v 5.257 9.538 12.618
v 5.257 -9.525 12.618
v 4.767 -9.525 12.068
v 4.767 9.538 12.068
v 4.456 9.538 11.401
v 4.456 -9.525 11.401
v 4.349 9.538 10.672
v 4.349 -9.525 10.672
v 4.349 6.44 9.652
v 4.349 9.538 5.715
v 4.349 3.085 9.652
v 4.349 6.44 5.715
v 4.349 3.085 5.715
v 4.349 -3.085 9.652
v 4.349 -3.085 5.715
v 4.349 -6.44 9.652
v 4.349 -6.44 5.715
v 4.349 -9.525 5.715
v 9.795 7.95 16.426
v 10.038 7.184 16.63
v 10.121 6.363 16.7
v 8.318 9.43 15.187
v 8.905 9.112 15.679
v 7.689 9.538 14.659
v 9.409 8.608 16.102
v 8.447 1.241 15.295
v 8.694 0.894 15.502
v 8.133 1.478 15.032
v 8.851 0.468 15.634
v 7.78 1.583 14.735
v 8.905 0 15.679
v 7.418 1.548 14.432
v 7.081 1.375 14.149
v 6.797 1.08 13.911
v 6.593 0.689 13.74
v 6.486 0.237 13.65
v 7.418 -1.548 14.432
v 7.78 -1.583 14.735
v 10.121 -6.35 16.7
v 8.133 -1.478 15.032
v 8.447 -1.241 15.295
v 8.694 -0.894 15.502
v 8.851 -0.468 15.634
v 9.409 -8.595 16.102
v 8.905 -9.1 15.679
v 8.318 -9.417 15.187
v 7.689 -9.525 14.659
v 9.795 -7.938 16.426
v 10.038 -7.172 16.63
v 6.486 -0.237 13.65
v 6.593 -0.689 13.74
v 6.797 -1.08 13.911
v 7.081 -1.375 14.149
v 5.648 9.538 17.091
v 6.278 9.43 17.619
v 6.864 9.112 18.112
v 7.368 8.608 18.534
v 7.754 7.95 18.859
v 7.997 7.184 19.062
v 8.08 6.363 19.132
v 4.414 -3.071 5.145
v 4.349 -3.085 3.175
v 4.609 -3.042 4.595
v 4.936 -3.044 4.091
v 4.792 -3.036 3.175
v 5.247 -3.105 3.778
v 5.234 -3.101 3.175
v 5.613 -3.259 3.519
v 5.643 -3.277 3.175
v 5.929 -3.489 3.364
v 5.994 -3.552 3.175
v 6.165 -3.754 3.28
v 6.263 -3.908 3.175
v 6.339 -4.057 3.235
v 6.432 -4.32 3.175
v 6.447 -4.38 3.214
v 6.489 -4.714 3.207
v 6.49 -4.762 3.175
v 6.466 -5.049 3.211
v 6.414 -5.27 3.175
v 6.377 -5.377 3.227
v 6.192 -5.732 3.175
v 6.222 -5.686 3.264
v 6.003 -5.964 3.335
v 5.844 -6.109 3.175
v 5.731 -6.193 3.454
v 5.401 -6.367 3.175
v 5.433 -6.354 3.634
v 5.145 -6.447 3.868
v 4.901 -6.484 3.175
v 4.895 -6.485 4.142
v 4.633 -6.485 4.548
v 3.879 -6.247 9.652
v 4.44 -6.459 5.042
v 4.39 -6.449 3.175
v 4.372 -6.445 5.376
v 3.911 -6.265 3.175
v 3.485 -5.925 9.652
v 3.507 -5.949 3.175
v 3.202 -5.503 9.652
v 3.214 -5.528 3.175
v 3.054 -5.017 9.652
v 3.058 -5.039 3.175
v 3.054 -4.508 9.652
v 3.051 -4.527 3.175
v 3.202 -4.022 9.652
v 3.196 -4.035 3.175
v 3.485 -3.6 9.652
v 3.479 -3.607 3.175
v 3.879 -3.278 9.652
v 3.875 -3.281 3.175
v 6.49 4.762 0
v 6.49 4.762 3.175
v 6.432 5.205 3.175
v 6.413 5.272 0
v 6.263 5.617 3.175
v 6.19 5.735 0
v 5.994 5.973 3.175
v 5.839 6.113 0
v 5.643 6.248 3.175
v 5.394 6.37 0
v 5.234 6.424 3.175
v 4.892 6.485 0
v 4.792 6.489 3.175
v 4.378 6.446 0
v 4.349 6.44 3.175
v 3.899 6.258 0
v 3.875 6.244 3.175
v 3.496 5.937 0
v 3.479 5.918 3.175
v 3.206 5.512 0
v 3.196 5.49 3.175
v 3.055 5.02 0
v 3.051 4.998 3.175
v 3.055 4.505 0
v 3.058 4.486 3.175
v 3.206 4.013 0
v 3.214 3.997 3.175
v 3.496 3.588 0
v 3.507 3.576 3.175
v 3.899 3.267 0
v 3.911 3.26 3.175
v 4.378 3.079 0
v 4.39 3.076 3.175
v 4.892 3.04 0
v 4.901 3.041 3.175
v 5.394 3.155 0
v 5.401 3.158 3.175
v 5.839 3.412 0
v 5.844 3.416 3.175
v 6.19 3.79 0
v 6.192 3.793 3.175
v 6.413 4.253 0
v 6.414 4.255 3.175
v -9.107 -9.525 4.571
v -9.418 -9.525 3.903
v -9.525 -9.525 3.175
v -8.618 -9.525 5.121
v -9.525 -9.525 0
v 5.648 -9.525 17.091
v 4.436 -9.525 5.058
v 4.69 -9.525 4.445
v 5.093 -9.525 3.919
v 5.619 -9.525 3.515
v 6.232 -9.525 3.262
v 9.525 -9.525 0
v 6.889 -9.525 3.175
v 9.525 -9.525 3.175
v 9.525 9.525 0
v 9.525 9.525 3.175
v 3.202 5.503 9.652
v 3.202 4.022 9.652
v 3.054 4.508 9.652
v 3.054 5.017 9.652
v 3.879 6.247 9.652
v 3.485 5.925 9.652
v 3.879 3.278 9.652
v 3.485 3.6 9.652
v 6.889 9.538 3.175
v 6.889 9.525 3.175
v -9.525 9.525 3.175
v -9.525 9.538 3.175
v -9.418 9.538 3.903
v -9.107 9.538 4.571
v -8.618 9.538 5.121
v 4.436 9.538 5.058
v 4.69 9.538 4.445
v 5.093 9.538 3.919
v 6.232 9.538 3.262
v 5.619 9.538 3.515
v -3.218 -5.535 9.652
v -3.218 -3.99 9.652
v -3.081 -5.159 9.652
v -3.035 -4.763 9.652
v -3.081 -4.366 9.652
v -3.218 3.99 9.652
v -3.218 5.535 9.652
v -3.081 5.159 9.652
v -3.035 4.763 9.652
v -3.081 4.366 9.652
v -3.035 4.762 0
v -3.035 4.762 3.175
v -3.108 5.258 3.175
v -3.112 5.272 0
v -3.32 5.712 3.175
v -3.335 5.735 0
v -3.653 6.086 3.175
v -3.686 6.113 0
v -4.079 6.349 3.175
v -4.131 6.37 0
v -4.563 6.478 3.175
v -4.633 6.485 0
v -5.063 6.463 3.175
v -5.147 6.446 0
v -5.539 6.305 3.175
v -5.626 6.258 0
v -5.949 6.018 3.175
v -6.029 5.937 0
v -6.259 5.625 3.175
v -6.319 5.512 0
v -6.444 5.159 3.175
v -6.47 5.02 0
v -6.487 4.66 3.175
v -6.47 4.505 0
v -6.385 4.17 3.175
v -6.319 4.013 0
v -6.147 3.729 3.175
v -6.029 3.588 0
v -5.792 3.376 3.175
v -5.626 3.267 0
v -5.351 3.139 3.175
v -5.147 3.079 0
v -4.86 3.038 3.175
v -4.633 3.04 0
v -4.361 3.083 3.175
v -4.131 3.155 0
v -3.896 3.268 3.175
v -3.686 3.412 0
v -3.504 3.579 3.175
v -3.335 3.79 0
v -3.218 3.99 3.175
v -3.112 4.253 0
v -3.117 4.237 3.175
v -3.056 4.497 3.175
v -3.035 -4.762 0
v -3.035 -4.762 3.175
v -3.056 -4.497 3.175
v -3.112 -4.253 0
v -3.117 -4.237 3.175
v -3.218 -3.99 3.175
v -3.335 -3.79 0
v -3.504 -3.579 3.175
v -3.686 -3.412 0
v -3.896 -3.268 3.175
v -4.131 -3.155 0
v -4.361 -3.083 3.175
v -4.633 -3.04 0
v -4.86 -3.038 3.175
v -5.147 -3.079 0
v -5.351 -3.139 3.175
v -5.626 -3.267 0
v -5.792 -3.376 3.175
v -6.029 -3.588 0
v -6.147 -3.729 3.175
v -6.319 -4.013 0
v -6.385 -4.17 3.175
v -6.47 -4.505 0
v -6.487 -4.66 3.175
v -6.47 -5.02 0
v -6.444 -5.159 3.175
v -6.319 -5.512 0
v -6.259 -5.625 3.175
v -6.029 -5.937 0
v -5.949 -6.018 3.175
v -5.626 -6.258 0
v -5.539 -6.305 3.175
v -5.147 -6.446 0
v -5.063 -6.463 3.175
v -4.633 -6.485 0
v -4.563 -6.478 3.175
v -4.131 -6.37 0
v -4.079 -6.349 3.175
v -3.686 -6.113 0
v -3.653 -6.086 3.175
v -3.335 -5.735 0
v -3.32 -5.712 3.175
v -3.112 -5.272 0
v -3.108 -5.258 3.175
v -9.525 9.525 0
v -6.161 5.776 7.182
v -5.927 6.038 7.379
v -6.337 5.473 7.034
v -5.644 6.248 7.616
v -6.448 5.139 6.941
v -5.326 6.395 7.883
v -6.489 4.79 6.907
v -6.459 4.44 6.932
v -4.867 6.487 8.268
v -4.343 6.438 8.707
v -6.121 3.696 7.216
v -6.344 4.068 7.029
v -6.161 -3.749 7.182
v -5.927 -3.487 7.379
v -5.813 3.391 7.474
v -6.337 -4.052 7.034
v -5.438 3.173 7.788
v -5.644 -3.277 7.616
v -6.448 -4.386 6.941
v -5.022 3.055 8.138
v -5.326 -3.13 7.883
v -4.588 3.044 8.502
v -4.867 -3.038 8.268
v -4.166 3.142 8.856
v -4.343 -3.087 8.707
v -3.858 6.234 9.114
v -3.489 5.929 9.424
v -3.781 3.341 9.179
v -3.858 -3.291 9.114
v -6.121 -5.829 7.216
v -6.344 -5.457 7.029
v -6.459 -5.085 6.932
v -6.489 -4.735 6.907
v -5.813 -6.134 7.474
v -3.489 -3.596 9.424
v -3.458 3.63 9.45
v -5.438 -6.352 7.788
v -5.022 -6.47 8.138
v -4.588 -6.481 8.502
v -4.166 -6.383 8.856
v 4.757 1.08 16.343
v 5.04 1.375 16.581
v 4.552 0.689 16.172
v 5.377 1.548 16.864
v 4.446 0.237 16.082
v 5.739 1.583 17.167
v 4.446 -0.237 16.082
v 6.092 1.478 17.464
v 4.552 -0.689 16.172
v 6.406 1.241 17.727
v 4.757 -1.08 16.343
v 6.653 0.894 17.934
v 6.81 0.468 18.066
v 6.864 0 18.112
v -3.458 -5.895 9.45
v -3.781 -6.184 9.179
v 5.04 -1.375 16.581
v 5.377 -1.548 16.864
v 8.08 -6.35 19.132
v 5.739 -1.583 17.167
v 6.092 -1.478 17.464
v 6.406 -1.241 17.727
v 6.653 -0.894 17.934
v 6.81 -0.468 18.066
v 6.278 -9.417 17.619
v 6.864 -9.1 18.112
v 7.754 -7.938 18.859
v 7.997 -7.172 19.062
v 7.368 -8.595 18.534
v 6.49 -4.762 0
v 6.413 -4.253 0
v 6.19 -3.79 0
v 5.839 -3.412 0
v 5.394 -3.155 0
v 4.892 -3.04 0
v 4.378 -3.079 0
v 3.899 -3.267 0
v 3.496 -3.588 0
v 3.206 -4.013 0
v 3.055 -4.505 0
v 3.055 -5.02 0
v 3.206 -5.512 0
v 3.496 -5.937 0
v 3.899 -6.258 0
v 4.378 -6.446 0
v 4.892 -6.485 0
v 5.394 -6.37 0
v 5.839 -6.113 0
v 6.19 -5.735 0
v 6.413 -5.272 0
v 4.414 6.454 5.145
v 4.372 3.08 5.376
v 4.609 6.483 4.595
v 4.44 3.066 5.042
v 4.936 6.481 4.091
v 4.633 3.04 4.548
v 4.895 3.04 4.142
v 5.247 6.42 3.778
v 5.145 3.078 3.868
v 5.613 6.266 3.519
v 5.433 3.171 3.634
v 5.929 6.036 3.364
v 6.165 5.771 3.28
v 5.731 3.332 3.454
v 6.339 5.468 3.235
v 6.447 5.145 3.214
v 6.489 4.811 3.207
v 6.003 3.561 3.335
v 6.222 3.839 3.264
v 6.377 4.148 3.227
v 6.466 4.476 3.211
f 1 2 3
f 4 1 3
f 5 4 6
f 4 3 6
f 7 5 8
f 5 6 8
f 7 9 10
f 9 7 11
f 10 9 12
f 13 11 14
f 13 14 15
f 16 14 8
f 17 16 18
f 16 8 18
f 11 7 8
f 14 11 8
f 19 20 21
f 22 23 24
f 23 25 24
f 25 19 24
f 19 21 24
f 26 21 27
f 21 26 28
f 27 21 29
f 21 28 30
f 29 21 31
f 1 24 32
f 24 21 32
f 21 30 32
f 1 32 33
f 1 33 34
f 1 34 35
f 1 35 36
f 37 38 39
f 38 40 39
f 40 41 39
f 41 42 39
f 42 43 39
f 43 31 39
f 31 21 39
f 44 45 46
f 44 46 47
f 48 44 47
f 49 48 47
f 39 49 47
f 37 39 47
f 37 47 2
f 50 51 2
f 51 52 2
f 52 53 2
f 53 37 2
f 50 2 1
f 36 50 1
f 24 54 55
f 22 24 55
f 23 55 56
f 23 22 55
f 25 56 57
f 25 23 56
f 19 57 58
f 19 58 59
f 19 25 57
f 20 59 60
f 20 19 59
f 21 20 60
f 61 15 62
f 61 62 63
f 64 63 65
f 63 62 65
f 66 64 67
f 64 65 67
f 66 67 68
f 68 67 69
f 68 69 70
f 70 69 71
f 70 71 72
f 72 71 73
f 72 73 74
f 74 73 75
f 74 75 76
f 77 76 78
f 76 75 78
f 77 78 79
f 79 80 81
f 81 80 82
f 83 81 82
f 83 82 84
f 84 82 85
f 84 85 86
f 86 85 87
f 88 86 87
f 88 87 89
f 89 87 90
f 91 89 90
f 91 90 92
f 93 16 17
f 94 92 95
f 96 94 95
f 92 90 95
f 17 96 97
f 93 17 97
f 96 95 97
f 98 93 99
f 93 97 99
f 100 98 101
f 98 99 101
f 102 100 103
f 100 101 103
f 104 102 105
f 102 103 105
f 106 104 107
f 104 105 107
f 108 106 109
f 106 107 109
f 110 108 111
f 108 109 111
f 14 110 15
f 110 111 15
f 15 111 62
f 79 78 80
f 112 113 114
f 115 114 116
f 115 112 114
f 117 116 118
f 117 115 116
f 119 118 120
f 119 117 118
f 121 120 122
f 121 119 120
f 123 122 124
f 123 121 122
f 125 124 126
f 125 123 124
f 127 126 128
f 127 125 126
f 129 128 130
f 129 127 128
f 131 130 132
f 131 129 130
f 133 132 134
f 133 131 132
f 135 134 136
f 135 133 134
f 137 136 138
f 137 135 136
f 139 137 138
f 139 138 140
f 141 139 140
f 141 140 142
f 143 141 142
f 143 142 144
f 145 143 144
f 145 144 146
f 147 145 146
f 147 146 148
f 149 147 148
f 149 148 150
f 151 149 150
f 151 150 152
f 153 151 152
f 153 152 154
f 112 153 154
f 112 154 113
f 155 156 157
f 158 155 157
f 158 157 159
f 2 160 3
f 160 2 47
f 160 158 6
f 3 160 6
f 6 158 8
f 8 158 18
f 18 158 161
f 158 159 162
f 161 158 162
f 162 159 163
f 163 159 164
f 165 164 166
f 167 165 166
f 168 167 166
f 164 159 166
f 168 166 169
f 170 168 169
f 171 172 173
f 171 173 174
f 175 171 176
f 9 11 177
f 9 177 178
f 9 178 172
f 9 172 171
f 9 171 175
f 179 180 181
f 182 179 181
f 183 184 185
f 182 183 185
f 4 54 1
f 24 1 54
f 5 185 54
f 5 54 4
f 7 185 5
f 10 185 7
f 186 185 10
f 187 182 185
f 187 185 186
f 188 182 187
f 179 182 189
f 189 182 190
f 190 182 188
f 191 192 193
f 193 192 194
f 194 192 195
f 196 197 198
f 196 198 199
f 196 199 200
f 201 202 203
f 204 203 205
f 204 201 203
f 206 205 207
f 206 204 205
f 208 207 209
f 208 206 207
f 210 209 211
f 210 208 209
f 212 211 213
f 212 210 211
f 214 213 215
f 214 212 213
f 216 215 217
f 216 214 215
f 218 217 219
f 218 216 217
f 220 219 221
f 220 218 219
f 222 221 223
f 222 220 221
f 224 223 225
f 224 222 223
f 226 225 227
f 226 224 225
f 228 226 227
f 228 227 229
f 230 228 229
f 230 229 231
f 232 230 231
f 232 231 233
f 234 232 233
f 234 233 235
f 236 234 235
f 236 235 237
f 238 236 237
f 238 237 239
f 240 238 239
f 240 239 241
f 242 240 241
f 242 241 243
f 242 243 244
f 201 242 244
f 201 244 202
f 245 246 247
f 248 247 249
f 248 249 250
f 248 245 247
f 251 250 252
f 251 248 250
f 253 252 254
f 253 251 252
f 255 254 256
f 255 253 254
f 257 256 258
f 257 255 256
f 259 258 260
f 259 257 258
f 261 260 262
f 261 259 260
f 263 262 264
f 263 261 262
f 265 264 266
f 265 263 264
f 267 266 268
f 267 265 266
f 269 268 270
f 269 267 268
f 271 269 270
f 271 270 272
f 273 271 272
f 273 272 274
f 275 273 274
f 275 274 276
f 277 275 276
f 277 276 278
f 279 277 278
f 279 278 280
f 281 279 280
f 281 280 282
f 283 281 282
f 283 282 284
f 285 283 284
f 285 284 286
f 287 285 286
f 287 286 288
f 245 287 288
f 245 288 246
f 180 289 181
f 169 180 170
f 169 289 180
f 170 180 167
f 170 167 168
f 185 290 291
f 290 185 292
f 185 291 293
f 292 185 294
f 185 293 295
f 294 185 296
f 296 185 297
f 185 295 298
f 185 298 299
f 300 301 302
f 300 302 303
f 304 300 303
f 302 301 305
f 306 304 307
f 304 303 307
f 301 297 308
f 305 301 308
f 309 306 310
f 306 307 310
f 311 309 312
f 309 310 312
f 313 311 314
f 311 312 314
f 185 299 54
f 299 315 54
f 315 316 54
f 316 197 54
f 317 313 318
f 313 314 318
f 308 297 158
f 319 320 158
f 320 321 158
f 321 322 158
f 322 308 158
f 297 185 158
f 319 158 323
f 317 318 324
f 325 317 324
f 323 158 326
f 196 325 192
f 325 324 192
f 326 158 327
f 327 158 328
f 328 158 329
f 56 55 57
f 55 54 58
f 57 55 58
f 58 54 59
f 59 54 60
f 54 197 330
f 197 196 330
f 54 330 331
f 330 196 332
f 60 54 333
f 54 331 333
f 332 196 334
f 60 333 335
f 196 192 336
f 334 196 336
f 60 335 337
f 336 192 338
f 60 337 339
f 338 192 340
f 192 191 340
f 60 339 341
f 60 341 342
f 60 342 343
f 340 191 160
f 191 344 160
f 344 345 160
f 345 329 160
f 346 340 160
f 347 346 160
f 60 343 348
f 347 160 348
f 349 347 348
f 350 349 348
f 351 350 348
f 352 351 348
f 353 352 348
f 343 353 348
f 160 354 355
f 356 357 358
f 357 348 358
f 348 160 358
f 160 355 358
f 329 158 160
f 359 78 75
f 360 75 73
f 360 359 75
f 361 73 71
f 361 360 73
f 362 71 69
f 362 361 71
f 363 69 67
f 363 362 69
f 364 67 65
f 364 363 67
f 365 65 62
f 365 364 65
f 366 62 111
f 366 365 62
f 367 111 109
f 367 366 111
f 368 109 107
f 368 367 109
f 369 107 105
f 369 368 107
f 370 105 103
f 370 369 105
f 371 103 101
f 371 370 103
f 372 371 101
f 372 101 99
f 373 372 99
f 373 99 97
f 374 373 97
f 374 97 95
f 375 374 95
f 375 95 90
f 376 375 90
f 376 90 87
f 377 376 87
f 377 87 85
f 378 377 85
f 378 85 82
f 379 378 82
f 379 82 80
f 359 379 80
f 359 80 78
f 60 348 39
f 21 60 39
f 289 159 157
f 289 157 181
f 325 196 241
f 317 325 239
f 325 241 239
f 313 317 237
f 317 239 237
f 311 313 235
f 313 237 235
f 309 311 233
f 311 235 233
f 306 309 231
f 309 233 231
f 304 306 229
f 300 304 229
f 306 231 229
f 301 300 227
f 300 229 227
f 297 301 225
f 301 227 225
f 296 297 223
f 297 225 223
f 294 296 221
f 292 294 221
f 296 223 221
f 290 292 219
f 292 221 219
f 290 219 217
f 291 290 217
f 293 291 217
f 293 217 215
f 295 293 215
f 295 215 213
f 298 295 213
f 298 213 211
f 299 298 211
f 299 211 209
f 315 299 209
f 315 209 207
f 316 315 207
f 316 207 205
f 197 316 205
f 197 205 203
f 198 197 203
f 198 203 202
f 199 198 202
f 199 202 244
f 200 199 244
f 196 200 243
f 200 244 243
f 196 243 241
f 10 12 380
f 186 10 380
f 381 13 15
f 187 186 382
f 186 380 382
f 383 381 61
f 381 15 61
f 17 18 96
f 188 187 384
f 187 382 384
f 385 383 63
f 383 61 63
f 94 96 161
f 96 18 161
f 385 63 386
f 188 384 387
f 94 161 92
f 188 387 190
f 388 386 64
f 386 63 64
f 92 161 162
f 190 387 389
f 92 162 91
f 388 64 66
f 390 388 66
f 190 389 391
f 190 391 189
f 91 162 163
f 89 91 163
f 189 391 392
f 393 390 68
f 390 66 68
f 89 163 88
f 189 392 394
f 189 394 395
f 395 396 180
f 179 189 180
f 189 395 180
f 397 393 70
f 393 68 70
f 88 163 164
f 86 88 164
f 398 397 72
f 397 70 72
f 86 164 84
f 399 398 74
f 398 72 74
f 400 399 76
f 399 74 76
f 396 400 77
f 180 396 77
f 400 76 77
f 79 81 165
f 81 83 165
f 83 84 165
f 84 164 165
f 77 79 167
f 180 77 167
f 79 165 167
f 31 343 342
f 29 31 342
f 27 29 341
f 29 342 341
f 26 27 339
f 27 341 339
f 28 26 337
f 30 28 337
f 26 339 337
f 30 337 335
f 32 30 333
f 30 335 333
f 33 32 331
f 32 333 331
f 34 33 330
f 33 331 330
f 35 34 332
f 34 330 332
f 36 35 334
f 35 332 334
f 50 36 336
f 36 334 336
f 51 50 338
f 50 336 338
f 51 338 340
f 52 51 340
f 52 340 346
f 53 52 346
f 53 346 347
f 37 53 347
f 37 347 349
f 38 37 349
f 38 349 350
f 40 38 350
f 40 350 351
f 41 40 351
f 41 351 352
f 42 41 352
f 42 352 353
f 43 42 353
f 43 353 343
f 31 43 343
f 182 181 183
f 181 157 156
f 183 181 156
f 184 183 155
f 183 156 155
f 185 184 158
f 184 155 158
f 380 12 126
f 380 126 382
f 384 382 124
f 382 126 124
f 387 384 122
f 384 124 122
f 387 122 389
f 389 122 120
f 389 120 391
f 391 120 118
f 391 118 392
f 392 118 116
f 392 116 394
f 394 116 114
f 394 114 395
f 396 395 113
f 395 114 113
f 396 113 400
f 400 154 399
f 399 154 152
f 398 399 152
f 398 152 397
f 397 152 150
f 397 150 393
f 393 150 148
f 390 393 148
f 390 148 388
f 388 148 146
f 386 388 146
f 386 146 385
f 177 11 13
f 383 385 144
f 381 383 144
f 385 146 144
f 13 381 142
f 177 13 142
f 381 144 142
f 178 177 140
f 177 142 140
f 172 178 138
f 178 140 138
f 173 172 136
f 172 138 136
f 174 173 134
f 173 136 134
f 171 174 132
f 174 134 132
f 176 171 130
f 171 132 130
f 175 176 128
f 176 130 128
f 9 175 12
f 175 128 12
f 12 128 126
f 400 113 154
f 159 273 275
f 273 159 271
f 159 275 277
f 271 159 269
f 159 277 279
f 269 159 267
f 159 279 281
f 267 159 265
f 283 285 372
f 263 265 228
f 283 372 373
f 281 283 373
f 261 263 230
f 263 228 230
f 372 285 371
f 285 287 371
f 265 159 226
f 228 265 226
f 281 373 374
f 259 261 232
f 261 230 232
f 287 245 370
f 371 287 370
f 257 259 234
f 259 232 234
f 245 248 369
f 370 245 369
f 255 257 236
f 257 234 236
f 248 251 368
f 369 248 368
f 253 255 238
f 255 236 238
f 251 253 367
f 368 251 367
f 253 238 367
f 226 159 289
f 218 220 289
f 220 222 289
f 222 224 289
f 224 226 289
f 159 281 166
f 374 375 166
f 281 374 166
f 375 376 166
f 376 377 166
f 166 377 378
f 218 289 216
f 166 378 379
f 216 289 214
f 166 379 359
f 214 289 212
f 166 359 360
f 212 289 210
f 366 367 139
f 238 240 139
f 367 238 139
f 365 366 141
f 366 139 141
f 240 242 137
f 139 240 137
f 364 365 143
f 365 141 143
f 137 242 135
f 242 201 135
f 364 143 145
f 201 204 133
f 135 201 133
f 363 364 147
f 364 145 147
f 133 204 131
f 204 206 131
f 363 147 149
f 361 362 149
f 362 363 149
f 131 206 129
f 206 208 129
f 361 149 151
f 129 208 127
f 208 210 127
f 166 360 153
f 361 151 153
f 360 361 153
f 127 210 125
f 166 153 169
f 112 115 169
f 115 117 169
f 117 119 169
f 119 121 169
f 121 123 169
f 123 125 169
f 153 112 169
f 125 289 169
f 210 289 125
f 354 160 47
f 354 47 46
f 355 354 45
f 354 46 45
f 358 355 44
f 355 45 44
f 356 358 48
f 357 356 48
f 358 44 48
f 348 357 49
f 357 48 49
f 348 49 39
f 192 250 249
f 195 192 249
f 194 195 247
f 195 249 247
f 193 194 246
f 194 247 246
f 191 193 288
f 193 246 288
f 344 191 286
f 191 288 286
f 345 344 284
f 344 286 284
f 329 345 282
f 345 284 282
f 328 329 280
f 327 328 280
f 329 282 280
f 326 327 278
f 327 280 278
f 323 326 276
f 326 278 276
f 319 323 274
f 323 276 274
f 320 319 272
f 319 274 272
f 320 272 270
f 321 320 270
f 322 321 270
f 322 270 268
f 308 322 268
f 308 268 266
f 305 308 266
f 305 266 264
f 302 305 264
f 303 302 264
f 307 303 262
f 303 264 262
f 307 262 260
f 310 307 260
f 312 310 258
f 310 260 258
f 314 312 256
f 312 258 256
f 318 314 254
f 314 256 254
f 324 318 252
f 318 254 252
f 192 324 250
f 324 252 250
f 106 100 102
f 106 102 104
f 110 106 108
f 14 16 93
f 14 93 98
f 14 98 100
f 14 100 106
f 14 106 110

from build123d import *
from build123d.topology import SkipClean

# Parameters (mm, degrees)
SKETCH1_W                = 19.05
SKETCH1_H                = 19.05
SKETCH1_R                = 1.7272
BOSS_EXTRUDE1_DEPTH      = 3.175
BOSS_EXTRUDE3_DEPTH      = 9.5377
BOSS_EXTRUDE3_DEPTH_BACK = 9.525
FILLET3_R                = 3.175
CUT_EXTRUDE1_REACH       = 24.243
SKETCH5_R                = 1.5875
SKETCH6_R                = 1.7272
CUT_EXTRUDE2_DEPTH       = 6.477


with BuildPart() as part:
    # Sketch1 → Boss-Extrude1 (new body)
    with BuildSketch(Plane.XY):
        Rectangle(SKETCH1_W, SKETCH1_H)
        with Locations((-4.7625, 4.7625)):
            Circle(SKETCH1_R, mode=Mode.SUBTRACT)
        with Locations((4.7625, 4.7625)):
            Circle(SKETCH1_R, mode=Mode.SUBTRACT)
        with Locations((4.7625, -4.7625)):
            Circle(SKETCH1_R, mode=Mode.SUBTRACT)
        with Locations((-4.7625, -4.7625)):
            Circle(SKETCH1_R, mode=Mode.SUBTRACT)
    extrude(amount=BOSS_EXTRUDE1_DEPTH)

    # Sketch4 → Boss-Extrude3 (add, two sides: drawn at the far end of the back side and taken through both)
    with BuildSketch(Plane(origin=(0, 0, 0), x_dir=(1, 0, 0), z_dir=(0, 1, 0)).offset(-BOSS_EXTRUDE3_DEPTH_BACK)):
        with BuildLine():
            Line((4.349358433, -10.6723009), (4.349358433, -5.715))
            ThreePointArc((4.349358433, -5.715), (5.093307209, -3.918948776), (6.889358433, -3.175))
            Line((6.889358433, -3.175), (-9.525, -3.175))
            ThreePointArc((-9.525, -3.175), (-9.287021779, -4.248450385), (-8.617680529, -5.120752886))
            Line((-8.617680529, -5.120752886), (8.080209457, -19.131946214))
            Line((8.080209457, -19.131946214), (10.121060118, -16.699755107))
            Line((10.121060118, -16.699755107), (5.256677904, -12.618053786))
            ThreePointArc((5.256677904, -12.618053786), (4.587336654, -11.745751285), (4.349358433, -10.6723009))
        make_face()
    extrude(amount=BOSS_EXTRUDE3_DEPTH + BOSS_EXTRUDE3_DEPTH_BACK)

    # Fillet3
    fillet3_edges = [part.edges().sort_by_distance(p)[0] for p in [
        (9.100634788, -9.525, 17.915850661),
        (9.100634788, 9.5377, 17.915850661),
    ]]
    fillet(fillet3_edges, radius=FILLET3_R)

    # Sketch5 → Cut-Extrude1 (cut, up to next)
    with BuildSketch(Plane(origin=(-6.082096576, 0, 7.248360445), x_dir=(0.7660444431189818, 0, 0.6427876096865349), z_dir=(-0.6427876096865349, 0, 0.7660444431189818)), mode=Mode.PRIVATE) as cut_extrude1_sk1:
        with Locations((15.31257753, 0)):
            Circle(SKETCH5_R)
    cut_extrude1_tool1 = extrude(cut_extrude1_sk1.sketch, amount=-CUT_EXTRUDE1_REACH, mode=Mode.PRIVATE) & part.part
    add(cut_extrude1_tool1.solids().sort_by_distance((5.648018, 0, 17.091096))[0], mode=Mode.SUBTRACT)

    # Sketch6 → Cut-Extrude2 (cut)
    with SkipClean():  # the faces are left unmerged after this step: merging them gives an invalid solid
        with BuildSketch(Plane(origin=(0, 0, 3.175), x_dir=(-1, 0, 0), z_dir=(0, 0, -1))):
            with Locations(Location((4.7625, -4.7625, 0), (0, 0, 153.441985656))):
                Circle(SKETCH6_R)
            with Locations(Location((4.7625, 4.7625, 0), (0, 0, 206.558014344))):
                Circle(SKETCH6_R)
            with Locations(Location((-4.7625, -4.7625, 0), (0, 0, 76.160831111))):
                Circle(SKETCH6_R)
            with Locations(Location((-4.7625, 4.7625, 0), (0, 0, 76.160831111))):
                Circle(SKETCH6_R)
        extrude(amount=-CUT_EXTRUDE2_DEPTH, mode=Mode.SUBTRACT)


solid = part.part
